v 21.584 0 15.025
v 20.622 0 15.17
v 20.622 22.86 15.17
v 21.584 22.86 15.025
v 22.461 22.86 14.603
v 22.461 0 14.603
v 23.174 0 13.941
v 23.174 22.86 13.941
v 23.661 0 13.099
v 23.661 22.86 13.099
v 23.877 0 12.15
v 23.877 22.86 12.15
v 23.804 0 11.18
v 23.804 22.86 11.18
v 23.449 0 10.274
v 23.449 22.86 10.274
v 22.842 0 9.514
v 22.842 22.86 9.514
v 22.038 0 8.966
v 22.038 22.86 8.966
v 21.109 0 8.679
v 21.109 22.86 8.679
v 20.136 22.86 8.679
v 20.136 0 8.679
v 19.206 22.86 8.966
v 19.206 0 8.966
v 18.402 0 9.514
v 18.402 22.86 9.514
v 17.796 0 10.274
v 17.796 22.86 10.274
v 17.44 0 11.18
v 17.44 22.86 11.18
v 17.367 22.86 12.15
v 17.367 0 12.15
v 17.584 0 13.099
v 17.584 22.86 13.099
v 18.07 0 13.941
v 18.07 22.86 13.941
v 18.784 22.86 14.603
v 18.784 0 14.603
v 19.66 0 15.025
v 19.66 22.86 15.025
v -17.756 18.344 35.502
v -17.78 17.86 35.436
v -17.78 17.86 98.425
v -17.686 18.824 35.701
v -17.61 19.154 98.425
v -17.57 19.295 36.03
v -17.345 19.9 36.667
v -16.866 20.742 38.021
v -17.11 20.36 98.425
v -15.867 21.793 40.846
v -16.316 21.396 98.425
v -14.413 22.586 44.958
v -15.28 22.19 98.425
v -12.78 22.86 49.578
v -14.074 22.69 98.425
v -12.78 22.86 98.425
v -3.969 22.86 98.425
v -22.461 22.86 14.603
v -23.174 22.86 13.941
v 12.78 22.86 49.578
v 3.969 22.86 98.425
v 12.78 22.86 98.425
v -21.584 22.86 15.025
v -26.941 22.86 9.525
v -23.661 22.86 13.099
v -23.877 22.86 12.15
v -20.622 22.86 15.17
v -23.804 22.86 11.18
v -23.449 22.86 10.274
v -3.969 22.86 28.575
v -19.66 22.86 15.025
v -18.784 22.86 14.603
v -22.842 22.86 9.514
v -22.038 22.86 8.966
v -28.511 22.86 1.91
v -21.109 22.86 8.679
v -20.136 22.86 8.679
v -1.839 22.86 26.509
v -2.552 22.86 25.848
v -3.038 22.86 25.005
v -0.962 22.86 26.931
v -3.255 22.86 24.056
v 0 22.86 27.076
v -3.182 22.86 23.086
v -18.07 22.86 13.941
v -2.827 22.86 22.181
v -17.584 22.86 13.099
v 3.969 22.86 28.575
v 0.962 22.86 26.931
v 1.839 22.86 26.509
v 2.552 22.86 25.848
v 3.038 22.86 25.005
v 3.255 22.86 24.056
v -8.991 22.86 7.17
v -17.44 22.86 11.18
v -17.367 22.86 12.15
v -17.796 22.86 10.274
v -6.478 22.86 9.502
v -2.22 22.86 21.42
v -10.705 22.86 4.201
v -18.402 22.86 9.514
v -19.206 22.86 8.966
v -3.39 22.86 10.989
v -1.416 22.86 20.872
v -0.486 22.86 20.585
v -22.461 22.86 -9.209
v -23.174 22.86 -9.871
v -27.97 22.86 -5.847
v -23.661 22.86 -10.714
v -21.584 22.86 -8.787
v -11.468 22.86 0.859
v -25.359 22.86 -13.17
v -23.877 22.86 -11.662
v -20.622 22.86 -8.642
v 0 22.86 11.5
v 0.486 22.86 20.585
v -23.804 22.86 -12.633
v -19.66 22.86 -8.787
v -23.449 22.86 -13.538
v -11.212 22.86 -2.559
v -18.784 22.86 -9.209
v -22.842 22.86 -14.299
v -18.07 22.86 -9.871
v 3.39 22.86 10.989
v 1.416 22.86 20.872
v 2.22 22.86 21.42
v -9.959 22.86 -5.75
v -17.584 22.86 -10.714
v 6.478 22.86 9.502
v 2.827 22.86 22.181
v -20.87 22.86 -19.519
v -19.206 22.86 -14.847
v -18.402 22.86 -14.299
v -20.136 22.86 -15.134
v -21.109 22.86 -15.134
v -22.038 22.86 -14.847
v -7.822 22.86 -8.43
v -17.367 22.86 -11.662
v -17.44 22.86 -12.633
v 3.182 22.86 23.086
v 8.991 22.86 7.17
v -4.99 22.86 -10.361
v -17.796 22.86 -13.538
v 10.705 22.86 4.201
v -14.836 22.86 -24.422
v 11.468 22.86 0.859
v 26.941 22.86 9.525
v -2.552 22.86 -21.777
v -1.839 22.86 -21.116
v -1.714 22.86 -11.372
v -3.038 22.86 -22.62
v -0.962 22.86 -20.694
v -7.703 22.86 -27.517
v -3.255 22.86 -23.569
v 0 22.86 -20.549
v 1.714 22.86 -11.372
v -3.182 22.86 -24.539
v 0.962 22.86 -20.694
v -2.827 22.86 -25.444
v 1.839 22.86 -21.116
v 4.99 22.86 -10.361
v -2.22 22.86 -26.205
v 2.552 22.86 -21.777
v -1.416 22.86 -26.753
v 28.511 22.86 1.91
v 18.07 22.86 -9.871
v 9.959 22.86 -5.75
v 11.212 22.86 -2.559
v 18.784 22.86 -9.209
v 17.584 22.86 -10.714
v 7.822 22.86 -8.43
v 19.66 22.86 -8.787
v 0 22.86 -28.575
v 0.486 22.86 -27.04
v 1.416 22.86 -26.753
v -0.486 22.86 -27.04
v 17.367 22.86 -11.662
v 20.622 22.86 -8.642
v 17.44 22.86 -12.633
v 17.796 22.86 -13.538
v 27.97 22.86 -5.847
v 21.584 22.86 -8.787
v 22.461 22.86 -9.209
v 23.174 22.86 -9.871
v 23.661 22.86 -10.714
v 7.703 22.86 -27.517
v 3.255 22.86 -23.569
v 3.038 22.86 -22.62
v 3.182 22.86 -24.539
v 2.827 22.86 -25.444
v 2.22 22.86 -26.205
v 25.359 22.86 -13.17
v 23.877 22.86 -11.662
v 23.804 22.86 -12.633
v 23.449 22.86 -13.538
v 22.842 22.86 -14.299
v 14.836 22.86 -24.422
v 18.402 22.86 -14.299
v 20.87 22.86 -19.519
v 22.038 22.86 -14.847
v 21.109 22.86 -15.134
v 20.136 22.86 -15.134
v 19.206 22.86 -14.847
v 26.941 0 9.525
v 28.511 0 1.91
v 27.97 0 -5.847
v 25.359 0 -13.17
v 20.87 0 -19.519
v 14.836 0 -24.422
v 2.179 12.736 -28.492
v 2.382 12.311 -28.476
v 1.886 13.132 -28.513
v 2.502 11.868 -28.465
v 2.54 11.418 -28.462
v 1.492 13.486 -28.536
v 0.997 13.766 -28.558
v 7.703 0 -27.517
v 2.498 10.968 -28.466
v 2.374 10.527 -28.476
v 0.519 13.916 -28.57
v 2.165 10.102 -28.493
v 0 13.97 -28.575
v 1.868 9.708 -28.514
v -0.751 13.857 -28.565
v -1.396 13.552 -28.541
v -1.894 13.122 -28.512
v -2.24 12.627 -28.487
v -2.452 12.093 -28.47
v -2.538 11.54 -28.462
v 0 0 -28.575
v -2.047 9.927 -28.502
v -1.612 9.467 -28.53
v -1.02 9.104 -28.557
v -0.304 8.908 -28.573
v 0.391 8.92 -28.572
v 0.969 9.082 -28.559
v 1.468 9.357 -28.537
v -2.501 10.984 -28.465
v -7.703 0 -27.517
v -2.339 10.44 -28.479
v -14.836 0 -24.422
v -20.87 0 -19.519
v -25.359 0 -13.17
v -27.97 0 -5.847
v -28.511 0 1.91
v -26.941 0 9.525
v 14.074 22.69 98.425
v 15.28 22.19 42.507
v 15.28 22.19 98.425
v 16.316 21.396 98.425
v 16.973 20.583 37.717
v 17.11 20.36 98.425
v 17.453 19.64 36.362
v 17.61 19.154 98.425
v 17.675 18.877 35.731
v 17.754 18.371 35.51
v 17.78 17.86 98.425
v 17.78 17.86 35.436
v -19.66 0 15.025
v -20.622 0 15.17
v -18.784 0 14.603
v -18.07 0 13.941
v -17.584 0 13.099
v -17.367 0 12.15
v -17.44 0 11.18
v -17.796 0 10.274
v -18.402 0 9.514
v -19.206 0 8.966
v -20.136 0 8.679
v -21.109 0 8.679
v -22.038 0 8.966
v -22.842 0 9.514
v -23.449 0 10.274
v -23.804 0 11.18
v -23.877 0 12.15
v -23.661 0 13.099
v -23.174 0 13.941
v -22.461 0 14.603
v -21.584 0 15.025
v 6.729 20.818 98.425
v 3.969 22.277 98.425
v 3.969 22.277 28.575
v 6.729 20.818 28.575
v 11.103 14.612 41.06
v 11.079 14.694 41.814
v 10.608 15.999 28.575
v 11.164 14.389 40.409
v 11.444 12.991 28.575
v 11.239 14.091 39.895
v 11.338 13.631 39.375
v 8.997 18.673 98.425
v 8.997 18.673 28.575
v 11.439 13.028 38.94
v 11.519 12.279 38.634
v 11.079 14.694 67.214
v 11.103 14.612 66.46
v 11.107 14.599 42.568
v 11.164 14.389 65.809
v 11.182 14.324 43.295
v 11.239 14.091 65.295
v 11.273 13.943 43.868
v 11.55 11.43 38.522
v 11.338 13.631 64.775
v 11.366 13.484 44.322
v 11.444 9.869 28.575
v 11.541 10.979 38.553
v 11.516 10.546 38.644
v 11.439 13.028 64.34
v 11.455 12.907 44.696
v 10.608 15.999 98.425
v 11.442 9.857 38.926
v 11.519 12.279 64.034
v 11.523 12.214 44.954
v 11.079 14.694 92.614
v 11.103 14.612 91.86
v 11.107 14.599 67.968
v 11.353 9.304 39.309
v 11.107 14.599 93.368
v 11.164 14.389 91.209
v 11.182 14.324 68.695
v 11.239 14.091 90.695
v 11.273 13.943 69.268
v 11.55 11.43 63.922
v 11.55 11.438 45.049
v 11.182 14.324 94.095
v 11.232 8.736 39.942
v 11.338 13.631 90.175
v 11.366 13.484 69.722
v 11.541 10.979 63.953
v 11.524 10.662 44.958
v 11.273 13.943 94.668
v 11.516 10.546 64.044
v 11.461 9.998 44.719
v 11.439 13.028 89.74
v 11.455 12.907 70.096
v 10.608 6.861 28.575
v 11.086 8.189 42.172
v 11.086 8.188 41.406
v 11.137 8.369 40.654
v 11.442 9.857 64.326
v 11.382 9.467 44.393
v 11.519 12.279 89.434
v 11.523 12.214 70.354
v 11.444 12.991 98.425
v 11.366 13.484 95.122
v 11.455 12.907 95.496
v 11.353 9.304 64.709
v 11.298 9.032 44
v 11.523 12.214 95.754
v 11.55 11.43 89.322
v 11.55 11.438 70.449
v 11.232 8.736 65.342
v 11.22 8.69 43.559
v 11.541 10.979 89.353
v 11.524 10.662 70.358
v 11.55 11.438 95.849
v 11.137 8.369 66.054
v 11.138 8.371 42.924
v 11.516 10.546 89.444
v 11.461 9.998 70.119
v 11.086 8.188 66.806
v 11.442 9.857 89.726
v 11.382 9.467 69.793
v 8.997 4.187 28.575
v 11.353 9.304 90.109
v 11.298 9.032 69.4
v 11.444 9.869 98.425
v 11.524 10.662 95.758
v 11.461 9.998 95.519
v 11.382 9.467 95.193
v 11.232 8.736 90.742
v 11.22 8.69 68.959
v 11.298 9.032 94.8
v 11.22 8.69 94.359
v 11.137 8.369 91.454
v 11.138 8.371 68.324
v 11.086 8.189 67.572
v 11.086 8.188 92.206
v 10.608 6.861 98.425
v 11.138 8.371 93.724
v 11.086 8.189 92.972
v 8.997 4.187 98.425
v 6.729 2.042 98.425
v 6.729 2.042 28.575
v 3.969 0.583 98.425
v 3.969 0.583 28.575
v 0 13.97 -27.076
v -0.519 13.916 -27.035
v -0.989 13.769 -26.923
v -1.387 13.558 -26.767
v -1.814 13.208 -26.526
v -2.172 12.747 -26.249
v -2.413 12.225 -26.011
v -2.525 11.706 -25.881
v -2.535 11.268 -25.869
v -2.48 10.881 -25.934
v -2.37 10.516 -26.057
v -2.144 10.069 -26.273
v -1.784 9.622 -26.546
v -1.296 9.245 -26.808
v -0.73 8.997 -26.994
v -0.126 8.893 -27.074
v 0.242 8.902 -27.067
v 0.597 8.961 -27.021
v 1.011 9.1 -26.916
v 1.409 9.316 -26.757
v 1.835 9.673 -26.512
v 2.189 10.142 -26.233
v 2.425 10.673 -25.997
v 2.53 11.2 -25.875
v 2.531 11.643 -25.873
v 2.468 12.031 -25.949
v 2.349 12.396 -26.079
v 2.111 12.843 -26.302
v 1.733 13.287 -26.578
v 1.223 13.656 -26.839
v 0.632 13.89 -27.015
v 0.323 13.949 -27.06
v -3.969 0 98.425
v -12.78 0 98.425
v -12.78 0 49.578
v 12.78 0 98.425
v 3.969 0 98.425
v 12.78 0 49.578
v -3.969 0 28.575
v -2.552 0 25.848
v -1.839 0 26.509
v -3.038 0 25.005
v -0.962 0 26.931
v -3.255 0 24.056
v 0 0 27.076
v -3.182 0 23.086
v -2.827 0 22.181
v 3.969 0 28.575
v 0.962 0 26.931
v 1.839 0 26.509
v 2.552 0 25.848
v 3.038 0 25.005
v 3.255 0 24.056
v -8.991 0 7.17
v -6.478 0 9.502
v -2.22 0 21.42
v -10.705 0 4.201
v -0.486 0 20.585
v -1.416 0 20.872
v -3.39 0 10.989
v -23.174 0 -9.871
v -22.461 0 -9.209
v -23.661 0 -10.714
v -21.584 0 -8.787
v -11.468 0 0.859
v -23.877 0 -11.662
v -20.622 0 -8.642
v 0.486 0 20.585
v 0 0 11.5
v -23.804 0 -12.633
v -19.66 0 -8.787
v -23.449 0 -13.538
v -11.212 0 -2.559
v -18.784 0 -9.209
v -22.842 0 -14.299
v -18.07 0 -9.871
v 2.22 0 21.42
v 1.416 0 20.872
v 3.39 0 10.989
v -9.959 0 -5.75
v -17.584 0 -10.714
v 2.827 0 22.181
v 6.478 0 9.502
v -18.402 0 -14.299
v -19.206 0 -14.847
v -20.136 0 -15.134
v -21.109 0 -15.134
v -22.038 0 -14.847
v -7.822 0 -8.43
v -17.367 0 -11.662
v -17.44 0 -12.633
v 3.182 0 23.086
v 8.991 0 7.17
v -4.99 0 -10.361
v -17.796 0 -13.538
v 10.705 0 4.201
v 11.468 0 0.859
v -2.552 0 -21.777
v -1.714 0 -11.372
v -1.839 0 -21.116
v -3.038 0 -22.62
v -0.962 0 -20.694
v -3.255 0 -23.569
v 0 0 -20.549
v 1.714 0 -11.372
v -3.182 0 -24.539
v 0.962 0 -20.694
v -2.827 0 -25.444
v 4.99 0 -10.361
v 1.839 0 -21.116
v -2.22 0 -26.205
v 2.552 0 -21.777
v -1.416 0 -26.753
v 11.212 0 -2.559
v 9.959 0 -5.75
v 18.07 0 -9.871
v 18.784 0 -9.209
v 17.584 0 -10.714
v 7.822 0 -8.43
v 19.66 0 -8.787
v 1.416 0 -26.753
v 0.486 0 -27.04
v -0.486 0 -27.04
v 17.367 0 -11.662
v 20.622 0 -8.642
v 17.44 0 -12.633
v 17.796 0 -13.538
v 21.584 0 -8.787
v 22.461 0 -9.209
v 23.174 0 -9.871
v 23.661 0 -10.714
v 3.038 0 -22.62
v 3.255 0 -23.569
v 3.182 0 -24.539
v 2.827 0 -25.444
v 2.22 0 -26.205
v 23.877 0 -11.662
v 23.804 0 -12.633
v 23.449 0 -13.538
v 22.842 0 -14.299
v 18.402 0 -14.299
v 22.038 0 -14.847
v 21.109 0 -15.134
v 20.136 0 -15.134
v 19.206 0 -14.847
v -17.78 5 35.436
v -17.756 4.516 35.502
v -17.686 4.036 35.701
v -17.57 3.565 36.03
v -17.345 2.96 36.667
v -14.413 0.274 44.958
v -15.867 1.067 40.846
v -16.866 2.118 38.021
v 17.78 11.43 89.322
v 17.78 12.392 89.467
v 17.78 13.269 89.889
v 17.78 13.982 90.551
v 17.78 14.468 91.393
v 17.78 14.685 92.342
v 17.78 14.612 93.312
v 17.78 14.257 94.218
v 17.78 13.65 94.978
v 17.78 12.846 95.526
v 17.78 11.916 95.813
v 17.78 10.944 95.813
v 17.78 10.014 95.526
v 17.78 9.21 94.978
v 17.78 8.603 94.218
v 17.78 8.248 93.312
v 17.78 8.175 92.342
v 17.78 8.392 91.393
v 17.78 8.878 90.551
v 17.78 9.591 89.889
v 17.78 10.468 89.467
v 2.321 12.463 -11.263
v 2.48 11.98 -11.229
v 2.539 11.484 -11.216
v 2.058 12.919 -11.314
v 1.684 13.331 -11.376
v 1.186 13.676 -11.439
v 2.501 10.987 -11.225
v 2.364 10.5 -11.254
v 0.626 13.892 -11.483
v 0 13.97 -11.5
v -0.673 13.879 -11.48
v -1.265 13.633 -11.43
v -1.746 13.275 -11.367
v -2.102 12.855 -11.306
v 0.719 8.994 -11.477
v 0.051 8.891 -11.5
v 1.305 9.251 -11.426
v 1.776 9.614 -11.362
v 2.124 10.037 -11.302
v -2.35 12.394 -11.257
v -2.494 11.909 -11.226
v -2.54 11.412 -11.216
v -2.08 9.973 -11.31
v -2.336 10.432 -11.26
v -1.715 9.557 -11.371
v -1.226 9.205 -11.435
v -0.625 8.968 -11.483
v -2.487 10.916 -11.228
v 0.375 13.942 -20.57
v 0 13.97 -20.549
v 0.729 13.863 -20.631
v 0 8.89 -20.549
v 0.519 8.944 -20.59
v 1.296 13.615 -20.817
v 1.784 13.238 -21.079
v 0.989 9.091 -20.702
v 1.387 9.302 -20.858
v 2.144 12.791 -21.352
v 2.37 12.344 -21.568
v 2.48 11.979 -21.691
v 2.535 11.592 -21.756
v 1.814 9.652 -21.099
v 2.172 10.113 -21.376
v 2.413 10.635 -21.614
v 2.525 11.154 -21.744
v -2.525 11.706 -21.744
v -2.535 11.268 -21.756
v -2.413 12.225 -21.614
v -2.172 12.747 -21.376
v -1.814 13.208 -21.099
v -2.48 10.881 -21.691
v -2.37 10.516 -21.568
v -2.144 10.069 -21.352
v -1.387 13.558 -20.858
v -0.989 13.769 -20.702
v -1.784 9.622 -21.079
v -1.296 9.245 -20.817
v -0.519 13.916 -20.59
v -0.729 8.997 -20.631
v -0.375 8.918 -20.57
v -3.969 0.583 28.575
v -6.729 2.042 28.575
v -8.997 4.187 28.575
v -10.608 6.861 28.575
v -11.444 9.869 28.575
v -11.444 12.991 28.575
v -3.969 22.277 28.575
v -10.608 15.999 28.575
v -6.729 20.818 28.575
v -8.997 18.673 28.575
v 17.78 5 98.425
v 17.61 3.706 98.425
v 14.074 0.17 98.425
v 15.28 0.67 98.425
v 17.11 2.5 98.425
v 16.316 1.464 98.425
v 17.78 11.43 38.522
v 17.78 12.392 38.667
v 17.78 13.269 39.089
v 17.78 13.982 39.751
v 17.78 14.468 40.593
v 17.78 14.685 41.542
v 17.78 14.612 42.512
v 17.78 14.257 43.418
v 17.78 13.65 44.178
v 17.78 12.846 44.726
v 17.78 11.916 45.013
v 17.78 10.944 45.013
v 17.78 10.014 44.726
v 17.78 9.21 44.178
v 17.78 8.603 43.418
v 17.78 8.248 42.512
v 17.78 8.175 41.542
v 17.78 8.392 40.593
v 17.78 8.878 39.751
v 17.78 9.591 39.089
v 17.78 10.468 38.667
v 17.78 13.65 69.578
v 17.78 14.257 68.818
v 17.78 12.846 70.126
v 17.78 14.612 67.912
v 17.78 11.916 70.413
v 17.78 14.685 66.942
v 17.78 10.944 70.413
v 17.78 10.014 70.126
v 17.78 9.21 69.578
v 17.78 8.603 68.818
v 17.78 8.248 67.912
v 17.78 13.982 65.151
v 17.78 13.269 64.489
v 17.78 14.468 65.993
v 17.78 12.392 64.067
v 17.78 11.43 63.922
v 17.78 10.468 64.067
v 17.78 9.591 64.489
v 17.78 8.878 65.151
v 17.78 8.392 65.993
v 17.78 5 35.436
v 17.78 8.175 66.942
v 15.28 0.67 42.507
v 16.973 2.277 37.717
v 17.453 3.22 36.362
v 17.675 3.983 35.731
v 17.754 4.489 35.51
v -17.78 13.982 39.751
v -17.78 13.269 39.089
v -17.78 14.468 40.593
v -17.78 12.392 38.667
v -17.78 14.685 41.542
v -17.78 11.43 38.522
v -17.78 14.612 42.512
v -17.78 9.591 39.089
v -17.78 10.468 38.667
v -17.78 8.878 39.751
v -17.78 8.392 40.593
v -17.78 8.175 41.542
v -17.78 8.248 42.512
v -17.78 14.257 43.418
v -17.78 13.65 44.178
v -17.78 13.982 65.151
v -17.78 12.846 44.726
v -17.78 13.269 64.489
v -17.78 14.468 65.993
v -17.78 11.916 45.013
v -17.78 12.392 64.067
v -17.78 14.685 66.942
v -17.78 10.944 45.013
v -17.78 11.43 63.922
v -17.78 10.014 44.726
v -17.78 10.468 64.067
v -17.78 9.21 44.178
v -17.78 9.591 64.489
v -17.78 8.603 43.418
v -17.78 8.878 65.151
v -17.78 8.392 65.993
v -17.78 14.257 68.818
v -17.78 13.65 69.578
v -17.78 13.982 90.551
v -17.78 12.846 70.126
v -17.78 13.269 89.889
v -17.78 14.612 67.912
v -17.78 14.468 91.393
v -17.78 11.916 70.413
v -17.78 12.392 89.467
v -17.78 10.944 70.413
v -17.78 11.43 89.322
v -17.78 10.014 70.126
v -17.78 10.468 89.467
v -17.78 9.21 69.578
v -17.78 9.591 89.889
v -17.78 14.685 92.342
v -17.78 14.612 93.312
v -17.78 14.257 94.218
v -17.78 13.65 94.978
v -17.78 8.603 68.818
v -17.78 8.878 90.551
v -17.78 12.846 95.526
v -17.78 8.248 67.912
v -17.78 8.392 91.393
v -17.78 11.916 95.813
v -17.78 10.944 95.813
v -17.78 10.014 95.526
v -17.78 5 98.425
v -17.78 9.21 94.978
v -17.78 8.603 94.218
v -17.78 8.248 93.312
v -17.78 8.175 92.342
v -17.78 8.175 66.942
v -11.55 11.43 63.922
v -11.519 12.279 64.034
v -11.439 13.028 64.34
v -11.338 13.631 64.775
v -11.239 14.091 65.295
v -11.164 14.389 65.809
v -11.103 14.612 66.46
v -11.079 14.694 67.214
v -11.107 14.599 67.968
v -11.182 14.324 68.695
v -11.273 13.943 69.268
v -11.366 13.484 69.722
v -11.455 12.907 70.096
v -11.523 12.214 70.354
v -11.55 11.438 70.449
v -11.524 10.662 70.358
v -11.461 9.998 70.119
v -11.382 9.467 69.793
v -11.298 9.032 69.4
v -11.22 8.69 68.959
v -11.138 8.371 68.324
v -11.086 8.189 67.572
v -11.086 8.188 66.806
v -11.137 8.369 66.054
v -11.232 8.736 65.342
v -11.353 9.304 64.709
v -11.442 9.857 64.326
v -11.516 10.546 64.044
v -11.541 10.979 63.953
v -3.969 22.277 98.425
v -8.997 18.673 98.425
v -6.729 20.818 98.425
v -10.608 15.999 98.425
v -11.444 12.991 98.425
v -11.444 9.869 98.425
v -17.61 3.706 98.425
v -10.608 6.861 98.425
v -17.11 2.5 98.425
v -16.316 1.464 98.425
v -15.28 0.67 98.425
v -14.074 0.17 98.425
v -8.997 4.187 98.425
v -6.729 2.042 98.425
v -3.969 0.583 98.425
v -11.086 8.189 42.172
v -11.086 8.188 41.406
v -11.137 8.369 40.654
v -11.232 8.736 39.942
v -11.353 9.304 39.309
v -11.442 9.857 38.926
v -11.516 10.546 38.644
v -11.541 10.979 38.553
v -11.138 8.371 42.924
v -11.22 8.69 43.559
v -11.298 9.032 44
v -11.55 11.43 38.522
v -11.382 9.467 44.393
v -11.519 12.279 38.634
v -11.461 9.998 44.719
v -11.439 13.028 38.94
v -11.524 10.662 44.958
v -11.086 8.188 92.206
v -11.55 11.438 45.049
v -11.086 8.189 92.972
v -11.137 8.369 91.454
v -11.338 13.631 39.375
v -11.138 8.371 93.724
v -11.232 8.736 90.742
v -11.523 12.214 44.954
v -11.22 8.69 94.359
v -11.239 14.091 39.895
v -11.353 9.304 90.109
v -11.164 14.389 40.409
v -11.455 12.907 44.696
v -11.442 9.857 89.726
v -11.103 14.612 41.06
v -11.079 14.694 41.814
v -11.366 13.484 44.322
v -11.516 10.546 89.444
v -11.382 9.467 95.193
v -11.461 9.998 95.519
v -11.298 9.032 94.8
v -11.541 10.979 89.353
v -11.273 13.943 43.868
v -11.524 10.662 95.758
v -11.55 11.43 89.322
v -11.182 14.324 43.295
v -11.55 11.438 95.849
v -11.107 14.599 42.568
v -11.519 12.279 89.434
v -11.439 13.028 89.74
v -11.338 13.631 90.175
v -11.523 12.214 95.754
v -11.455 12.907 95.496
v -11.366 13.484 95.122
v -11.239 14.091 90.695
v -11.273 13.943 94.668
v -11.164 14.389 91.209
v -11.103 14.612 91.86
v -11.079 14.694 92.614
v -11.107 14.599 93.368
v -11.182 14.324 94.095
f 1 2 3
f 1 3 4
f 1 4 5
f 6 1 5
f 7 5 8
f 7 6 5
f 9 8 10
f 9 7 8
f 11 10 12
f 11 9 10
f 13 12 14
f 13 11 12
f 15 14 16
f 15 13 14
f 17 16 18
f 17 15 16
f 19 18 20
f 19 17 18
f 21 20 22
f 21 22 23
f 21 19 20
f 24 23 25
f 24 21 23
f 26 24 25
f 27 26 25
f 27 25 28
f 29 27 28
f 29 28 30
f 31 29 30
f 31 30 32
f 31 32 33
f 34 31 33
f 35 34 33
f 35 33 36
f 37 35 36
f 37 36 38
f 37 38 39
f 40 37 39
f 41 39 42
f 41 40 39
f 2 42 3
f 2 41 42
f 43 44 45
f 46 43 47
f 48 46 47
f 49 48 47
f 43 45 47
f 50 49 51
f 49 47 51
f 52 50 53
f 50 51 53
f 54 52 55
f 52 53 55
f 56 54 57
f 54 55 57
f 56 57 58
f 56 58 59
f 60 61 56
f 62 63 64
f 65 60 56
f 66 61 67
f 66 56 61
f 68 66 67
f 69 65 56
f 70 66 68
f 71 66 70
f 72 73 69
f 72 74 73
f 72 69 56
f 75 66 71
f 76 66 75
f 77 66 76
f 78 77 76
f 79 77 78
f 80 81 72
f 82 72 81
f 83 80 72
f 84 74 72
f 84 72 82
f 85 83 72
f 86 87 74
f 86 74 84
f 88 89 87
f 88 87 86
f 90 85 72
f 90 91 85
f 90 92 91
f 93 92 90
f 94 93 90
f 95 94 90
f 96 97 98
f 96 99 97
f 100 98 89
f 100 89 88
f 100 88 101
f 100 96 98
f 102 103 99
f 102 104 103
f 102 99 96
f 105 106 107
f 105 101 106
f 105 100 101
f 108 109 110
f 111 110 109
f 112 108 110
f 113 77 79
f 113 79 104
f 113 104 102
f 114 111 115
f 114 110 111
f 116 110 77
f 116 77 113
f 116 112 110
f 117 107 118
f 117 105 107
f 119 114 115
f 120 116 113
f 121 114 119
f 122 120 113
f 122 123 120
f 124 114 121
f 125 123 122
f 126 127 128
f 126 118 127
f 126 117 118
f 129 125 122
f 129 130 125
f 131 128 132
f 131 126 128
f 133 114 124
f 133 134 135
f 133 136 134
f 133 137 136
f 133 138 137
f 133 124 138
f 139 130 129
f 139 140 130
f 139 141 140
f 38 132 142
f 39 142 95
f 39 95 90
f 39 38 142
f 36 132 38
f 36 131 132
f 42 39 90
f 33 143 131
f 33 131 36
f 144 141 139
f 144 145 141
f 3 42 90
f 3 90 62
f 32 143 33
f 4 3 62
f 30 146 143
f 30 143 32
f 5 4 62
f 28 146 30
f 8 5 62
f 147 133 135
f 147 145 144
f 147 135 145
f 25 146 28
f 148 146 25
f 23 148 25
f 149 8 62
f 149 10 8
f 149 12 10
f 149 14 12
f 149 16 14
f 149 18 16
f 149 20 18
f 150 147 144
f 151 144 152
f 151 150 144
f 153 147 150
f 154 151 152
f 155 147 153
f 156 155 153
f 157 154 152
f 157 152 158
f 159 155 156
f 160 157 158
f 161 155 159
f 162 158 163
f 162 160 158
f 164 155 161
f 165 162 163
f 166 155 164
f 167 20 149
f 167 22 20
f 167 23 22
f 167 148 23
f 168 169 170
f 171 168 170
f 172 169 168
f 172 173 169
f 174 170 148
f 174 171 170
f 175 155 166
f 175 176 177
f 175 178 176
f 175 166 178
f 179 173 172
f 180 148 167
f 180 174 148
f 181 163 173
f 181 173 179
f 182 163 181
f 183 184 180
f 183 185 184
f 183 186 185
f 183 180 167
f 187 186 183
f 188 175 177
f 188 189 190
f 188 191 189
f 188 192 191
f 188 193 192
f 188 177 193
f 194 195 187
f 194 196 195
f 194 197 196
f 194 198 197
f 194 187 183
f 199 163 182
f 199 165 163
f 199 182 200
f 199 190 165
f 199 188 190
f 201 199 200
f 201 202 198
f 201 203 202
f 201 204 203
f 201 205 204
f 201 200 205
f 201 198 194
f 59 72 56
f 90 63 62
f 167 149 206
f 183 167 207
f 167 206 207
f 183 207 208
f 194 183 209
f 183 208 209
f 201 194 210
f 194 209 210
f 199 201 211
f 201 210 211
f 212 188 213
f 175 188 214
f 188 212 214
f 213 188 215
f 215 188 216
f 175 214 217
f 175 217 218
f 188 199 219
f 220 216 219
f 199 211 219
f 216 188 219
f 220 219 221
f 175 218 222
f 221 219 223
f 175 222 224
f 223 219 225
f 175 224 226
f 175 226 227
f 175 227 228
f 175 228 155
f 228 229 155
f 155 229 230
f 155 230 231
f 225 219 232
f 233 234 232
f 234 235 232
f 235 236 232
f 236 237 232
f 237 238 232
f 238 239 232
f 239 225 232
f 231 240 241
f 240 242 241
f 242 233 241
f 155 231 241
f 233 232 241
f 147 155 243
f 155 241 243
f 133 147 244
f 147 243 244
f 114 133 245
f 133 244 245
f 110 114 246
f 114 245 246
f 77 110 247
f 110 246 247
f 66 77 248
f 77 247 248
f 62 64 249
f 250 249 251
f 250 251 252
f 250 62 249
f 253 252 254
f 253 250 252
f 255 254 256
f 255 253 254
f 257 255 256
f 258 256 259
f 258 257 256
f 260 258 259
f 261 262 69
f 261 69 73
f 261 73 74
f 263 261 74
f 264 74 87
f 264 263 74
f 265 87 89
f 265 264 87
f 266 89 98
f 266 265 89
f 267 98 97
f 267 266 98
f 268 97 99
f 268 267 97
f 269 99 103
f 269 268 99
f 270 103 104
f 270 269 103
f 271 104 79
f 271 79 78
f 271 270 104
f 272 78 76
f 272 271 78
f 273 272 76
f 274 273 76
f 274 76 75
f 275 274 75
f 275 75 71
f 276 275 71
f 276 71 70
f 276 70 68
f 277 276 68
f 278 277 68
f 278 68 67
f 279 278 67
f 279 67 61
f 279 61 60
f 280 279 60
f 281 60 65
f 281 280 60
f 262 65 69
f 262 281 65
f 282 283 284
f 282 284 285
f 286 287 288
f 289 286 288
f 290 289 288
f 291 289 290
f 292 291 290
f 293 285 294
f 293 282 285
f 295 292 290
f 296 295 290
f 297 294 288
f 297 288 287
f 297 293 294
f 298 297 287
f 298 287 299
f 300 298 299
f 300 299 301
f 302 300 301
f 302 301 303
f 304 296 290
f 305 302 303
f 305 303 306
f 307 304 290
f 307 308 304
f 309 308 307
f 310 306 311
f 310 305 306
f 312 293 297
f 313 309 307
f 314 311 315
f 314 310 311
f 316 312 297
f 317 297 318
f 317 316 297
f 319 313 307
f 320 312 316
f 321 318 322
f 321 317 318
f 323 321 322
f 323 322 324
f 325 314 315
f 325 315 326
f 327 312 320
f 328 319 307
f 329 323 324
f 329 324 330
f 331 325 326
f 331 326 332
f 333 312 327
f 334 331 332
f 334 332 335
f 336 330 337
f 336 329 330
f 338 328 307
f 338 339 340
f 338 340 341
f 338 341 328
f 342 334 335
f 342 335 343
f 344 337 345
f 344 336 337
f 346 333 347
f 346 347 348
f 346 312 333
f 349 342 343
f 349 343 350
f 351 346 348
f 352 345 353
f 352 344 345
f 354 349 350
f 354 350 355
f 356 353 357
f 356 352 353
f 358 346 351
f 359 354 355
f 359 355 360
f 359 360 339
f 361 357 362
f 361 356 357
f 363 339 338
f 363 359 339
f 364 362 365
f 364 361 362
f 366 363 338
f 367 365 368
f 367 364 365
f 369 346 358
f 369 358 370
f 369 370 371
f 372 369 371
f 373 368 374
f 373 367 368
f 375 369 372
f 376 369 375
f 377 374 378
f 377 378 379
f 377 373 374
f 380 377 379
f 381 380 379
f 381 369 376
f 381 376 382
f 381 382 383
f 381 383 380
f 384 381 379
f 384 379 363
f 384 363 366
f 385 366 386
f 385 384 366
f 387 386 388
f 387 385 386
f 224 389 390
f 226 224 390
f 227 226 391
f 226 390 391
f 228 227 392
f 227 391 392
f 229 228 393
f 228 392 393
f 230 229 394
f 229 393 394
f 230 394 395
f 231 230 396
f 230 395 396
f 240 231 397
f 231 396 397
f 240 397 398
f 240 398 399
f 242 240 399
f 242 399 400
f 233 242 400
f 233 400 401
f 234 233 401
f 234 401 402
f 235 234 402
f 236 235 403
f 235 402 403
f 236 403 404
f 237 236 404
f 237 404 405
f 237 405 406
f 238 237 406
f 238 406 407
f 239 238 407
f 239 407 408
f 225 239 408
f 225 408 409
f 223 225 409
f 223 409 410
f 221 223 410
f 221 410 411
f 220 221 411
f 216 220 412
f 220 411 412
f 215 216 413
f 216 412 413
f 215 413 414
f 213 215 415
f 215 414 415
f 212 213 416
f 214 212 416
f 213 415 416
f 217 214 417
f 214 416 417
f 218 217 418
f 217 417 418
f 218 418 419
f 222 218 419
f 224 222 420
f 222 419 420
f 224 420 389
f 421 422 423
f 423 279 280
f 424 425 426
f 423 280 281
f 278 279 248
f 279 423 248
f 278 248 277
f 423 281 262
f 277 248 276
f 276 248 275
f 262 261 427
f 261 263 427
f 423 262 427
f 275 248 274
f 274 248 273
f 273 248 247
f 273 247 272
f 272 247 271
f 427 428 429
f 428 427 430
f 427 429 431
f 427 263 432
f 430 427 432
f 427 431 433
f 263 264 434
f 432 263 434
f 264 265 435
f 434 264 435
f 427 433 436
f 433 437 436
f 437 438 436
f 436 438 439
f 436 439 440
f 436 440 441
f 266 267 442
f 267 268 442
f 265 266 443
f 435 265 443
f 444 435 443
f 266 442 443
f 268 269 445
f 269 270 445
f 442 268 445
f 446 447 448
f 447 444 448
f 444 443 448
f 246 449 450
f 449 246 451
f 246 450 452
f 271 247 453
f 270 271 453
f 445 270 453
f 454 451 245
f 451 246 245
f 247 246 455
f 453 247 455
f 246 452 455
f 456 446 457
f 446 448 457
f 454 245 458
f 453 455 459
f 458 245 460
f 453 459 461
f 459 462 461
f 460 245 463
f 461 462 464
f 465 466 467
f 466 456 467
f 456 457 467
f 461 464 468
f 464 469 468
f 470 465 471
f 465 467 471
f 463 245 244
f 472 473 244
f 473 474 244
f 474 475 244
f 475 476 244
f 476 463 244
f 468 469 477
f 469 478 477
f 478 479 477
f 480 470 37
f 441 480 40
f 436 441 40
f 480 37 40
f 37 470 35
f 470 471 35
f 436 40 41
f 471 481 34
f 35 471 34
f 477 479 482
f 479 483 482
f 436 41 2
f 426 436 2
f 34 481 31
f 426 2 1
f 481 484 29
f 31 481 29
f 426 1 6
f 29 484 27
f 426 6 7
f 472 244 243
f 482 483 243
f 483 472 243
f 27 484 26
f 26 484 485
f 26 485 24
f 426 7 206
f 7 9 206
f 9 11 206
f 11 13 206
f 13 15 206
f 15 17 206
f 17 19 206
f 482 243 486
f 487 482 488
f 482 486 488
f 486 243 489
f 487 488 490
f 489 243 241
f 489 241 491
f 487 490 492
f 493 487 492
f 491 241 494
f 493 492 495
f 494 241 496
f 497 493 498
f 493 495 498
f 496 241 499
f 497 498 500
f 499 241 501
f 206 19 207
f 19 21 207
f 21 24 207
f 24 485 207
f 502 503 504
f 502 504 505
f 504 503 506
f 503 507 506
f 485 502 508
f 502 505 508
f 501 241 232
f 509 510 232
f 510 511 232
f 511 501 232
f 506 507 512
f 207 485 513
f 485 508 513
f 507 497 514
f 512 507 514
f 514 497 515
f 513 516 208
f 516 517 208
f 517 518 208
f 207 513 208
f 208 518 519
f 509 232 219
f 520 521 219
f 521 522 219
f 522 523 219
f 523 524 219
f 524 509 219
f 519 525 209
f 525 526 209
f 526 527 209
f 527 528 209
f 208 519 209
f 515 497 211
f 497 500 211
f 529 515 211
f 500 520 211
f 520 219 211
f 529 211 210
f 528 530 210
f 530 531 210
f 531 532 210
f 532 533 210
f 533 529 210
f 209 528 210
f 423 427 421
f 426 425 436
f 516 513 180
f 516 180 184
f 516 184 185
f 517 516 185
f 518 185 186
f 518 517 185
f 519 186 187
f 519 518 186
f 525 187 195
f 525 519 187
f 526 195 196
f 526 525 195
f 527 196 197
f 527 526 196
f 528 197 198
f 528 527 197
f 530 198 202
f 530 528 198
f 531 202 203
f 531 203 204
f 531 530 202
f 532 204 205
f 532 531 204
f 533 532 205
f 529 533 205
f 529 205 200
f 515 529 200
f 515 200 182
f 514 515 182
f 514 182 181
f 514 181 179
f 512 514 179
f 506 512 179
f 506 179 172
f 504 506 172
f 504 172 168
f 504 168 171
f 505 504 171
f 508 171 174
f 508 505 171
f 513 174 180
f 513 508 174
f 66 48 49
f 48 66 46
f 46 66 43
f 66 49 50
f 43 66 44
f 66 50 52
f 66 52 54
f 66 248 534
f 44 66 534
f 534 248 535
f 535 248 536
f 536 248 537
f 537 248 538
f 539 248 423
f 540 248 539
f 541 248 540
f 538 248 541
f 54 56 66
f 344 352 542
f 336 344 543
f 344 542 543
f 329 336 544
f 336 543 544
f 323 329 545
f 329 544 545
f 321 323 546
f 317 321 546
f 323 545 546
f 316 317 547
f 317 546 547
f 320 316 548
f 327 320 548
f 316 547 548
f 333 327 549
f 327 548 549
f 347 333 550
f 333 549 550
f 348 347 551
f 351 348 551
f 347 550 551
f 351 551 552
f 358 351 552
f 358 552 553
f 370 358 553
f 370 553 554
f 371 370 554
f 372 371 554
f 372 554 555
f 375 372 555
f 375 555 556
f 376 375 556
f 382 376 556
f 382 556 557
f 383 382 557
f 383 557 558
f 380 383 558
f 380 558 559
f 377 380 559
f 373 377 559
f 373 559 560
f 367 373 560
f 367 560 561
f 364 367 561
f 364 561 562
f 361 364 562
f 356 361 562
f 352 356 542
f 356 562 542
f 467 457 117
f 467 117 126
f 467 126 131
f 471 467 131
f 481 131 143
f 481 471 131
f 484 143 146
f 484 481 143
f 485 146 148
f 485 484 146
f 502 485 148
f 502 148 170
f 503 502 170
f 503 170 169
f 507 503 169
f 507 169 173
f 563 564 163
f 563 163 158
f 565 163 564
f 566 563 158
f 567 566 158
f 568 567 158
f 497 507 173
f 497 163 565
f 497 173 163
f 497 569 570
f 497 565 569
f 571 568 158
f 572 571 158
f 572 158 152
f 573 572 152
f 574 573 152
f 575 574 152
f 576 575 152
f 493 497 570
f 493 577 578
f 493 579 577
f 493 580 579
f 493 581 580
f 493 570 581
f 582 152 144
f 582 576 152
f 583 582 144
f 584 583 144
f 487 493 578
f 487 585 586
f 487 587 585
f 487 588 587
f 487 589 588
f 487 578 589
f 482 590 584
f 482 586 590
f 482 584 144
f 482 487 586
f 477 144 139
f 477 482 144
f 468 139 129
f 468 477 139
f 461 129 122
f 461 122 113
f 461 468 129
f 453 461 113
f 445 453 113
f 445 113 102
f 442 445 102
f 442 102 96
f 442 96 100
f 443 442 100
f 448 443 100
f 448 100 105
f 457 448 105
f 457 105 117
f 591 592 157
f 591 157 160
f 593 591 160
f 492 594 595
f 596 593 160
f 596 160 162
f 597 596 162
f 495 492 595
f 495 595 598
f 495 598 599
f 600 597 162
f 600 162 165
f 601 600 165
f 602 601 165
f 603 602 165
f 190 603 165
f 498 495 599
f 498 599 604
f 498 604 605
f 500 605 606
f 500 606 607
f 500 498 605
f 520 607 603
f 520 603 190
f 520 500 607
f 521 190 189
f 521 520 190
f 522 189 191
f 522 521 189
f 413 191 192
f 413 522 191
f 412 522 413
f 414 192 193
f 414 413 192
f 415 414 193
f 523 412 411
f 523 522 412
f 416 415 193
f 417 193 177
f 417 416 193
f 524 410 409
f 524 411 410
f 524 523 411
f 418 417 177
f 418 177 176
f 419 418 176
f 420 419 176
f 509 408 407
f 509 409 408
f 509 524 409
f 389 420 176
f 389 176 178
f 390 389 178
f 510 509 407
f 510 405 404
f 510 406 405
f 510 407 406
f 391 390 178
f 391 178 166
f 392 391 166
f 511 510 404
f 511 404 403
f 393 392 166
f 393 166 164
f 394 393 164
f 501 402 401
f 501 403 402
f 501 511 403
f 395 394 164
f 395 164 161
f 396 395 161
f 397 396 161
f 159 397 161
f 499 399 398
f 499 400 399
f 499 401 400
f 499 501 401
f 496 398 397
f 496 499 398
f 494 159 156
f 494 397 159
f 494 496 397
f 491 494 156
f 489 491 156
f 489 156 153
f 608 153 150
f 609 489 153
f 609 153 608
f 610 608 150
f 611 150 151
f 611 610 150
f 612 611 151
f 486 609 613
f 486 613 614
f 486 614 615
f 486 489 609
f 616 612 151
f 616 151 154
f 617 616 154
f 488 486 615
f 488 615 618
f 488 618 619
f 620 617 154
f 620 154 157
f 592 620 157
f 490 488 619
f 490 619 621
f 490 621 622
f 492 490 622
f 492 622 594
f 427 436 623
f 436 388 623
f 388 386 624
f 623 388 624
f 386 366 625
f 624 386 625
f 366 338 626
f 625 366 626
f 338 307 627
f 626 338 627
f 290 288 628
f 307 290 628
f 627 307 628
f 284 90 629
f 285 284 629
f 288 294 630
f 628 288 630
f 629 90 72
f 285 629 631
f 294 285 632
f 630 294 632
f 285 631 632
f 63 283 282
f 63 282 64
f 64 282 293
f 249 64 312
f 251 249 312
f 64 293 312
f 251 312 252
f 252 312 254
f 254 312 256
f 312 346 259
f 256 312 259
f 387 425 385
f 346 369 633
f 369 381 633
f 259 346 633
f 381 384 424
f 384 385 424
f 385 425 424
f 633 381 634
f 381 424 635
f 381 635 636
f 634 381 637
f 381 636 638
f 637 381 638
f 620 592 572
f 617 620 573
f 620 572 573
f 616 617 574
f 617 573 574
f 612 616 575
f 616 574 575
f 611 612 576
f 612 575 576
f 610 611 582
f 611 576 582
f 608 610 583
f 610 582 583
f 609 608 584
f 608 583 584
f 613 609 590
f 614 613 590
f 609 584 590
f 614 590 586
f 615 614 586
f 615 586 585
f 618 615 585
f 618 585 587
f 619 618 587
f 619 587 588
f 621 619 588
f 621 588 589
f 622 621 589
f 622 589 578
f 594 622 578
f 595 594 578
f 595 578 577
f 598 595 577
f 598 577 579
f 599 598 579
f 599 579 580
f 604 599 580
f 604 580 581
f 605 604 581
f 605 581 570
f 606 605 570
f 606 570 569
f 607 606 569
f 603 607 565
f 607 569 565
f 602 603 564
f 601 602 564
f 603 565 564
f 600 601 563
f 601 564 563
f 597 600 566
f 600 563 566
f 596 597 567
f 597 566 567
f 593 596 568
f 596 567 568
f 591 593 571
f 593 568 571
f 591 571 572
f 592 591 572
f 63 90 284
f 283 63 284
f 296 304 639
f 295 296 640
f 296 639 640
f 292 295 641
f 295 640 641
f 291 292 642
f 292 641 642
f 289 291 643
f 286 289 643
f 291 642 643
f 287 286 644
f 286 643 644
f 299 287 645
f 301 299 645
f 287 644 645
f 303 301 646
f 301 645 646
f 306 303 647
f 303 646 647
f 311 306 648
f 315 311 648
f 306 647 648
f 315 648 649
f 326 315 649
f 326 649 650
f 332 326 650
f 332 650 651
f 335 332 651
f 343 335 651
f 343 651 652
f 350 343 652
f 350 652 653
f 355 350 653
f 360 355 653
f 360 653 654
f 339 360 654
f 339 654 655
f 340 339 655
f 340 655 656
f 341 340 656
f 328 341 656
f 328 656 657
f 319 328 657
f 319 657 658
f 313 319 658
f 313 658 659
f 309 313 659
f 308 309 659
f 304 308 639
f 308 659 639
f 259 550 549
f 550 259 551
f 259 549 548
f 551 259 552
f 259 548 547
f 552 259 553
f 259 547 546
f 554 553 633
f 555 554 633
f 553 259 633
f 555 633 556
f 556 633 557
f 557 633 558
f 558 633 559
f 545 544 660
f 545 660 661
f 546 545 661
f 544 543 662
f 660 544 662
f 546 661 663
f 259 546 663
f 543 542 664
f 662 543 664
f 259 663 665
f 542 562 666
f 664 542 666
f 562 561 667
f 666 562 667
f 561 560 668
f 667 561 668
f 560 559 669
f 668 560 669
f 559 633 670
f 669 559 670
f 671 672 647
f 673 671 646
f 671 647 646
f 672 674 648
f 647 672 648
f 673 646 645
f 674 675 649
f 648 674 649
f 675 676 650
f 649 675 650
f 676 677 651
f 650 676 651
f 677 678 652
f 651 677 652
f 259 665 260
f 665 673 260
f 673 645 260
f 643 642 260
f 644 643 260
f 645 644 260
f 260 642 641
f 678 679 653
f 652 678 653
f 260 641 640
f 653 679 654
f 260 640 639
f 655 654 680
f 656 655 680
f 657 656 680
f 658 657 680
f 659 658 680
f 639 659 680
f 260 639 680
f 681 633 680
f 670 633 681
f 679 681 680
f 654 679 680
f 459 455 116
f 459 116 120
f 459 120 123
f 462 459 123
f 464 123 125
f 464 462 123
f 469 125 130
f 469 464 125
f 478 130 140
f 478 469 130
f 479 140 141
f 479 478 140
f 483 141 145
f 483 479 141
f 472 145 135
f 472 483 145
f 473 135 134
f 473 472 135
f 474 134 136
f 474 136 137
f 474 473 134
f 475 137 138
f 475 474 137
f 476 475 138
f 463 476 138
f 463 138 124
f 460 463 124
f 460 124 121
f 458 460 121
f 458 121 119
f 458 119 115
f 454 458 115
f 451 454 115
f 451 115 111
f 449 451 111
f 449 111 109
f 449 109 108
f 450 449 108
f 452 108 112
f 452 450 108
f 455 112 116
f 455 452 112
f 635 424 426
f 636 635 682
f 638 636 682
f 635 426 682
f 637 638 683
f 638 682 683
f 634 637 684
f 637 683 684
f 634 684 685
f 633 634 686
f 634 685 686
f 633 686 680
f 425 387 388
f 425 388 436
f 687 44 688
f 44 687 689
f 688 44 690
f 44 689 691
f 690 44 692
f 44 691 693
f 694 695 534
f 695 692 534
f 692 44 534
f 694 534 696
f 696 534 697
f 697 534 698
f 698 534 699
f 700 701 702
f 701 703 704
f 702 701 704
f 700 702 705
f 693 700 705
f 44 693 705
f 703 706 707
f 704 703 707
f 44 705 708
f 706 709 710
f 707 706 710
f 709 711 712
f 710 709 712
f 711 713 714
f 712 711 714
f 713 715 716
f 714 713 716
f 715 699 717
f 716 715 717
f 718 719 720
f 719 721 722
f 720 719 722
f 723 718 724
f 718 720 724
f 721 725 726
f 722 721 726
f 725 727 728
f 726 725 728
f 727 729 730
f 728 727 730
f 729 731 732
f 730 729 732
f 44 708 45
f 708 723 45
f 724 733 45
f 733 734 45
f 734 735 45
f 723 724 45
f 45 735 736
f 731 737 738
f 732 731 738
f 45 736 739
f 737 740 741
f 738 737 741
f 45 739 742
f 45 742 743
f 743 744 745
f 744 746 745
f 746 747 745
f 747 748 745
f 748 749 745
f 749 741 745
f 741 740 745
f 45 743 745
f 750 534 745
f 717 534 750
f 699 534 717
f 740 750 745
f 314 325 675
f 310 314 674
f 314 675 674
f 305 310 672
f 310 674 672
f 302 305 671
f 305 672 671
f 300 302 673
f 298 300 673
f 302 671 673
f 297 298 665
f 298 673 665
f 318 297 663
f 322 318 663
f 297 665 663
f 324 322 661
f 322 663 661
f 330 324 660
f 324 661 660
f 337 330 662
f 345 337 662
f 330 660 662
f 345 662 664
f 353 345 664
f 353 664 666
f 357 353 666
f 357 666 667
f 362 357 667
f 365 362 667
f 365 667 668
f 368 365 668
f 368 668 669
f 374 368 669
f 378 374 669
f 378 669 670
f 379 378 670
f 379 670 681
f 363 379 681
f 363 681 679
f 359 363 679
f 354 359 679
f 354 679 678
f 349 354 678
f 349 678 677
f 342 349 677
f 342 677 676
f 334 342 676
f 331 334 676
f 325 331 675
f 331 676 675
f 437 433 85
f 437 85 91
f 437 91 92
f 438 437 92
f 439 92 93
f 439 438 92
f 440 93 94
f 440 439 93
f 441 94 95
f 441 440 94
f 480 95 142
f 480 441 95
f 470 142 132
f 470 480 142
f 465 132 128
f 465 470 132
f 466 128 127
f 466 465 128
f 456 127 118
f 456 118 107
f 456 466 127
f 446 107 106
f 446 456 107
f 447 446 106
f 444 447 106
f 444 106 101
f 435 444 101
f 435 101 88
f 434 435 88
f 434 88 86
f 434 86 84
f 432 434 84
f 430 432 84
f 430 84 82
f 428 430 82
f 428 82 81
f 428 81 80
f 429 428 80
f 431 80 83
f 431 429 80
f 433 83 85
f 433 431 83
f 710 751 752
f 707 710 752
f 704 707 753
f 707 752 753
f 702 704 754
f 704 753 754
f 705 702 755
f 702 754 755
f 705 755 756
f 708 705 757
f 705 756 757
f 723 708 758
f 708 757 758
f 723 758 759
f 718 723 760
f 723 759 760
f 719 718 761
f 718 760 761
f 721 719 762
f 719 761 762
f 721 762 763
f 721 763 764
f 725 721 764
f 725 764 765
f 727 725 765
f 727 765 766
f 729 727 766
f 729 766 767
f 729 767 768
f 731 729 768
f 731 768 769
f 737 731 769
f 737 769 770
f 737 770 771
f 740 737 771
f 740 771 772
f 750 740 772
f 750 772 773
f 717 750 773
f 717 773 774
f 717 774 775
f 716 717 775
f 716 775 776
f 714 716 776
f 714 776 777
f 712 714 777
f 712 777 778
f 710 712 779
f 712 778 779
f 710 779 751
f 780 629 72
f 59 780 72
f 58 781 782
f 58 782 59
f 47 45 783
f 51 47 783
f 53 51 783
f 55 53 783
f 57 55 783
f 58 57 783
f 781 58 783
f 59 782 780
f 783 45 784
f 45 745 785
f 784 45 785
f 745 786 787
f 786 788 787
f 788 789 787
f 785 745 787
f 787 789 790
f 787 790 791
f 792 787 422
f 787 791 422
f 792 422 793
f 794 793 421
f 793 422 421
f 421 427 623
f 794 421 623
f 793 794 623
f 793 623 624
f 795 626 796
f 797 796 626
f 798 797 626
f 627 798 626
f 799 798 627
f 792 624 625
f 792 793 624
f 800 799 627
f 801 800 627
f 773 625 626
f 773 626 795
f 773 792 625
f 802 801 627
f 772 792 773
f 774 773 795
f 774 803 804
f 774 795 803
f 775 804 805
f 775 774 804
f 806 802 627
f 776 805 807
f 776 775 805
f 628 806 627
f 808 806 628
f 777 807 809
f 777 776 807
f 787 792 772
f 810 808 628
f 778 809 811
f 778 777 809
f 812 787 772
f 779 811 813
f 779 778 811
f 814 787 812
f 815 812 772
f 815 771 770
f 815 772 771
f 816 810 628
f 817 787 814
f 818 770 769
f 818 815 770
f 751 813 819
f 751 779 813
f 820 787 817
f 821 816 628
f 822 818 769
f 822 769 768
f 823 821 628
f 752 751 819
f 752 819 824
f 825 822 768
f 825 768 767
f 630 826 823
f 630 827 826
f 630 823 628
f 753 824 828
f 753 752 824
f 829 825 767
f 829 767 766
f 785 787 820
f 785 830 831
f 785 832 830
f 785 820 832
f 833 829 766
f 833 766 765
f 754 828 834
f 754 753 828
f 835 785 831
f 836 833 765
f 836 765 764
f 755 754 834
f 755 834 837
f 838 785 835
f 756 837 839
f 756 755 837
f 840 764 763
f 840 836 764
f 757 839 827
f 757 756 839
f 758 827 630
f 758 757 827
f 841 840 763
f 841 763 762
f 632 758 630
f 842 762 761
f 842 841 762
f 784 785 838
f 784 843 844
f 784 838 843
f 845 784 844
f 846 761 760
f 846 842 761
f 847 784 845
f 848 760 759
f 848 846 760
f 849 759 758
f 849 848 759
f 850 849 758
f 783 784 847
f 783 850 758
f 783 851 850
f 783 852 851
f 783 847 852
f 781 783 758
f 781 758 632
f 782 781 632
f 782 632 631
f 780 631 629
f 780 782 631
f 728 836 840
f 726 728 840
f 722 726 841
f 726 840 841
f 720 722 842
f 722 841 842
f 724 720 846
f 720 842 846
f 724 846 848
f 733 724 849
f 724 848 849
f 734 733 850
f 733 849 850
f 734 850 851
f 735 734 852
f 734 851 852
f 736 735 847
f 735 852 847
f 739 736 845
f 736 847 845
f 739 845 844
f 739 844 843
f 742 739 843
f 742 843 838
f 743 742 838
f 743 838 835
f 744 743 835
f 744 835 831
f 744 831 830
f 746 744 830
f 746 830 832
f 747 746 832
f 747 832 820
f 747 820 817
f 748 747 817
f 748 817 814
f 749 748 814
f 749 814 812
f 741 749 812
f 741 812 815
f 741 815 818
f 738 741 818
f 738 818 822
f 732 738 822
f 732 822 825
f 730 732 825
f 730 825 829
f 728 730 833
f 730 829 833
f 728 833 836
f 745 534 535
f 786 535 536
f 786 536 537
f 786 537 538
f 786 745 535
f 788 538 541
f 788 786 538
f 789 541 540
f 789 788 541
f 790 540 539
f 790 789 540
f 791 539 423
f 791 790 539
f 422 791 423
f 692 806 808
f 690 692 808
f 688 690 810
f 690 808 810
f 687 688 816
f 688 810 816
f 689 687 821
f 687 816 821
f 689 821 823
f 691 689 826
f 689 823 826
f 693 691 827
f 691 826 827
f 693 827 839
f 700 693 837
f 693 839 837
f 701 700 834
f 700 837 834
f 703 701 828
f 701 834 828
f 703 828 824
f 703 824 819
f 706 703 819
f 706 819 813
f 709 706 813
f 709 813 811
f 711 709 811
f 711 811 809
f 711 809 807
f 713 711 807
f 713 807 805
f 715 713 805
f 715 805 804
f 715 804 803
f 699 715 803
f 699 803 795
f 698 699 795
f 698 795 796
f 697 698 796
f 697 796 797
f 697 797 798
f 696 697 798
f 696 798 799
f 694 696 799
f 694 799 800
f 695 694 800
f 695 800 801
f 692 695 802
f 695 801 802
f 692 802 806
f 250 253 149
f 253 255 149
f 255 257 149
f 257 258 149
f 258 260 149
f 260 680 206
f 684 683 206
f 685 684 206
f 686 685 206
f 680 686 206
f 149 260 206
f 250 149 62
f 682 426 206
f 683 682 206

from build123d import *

# Parameters (mm, degrees)
SKETCH3_R               = 11.5
SKETCH3_R_2             = 3.2639
BOSS_EXTRUDE1_DEPTH     = 22.86
CUT_EXTRUDE1_DEPTH      = 69.85
SKETCH6_R               = 3.2639
CUT_EXTRUDE2_DEPTH      = 112.17034789
FILLET1_R               = 5
CUT_EXTRUDE4_REACH      = 97.698
CUT_EXTRUDE4_END_RADIUS = 28.575
SKETCH8_R               = 2.54


with BuildPart() as part:
    # Sketch3 → Boss-Extrude1 (new body)
    with BuildSketch(Plane(origin=(0, 0, 0), x_dir=(1, 0, 0), z_dir=(0, 1, 0))):
        with BuildLine():
            Line((-26.940768363, -9.525), (-17.78, -35.435565722))
            Line((-17.78, -35.435565722), (-17.78, -98.425))
            Line((-17.78, -98.425), (17.78, -98.425))
            Line((17.78, -98.425), (17.78, -35.435565722))
            Line((17.78, -35.435565722), (26.940768363, -9.525))
            ThreePointArc((26.940768363, -9.525), (0, 28.575), (-26.940768363, -9.525))
        make_face()
        with Locations(Location((0, 0, 0), (0, 0, 270))):
            Circle(SKETCH3_R, mode=Mode.SUBTRACT)
        with Locations(Location((0, 23.8125, 0), (0, 0, 270))):
            Circle(SKETCH3_R_2, mode=Mode.SUBTRACT)
        with Locations(Location((20.622229928, 11.90625, 0), (0, 0, 270))):
            Circle(SKETCH3_R_2, mode=Mode.SUBTRACT)
        with Locations(Location((20.622229928, -11.90625, 0), (0, 0, 270))):
            Circle(SKETCH3_R_2, mode=Mode.SUBTRACT)
        with Locations(Location((0, -23.8125, 0), (0, 0, 270))):
            Circle(SKETCH3_R_2, mode=Mode.SUBTRACT)
        with Locations(Location((-20.622229928, -11.90625, 0), (0, 0, 270))):
            Circle(SKETCH3_R_2, mode=Mode.SUBTRACT)
        with Locations(Location((-20.622229928, 11.90625, 0), (0, 0, 270))):
            Circle(SKETCH3_R_2, mode=Mode.SUBTRACT)
    extrude(amount=BOSS_EXTRUDE1_DEPTH)

    # Sketch4 → Cut-Extrude1 (cut)
    with BuildSketch(Plane.XY.offset(98.425)):
        with BuildLine():
            Line((3.96875, 0), (-3.96875, 0))
            Line((-3.96875, 0), (-3.96875, 0.583271302))
            ThreePointArc((-3.96875, 0.583271302), (-11.55, 11.43), (-3.96875, 22.276728698))
            Line((-3.96875, 22.276728698), (-3.96875, 22.86))
            Line((-3.96875, 22.86), (3.96875, 22.86))
            Line((3.96875, 22.86), (3.96875, 22.276728698))
            ThreePointArc((3.96875, 22.276728698), (11.55, 11.43), (3.96875, 0.583271302))
            Line((3.96875, 0.583271302), (3.96875, 0))
        make_face()
    extrude(amount=-CUT_EXTRUDE1_DEPTH, mode=Mode.SUBTRACT)

    # Sketch6 → Cut-Extrude2 (cut, through all)
    with BuildSketch(Plane(origin=(17.78, 0, 0), x_dir=(0, 0, -1), z_dir=(1, 0, 0))):
        with Locations((-41.785565722, 11.43)):
            Circle(SKETCH6_R)
        with Locations((-67.185565722, 11.43)):
            Circle(SKETCH6_R)
        with Locations((-92.585565722, 11.43)):
            Circle(SKETCH6_R)
    extrude(amount=-CUT_EXTRUDE2_DEPTH, mode=Mode.SUBTRACT)

    # Fillet1
    fillet1_edges = [part.edges().sort_by_distance(p)[0] for p in [
        (-17.78, 22.86, 66.930282861),
        (17.78, 22.86, 66.930282861),
        (-17.78, 0, 66.930282861),
        (17.78, 0, 66.930282861),
    ]]
    fillet(fillet1_edges, radius=FILLET1_R)

    # Cut-Extrude4: up to this cylinder (the profile starts inside it)
    cut_extrude4_end = Plane(origin=(0, 11.43, 0), z_dir=(0, -1, 0)) * Cylinder(CUT_EXTRUDE4_END_RADIUS, 253.546, mode=Mode.PRIVATE)
    # Sketch8 → Cut-Extrude4 (cut, up to the surface)
    with BuildSketch(Plane.XY.offset(10), mode=Mode.PRIVATE) as cut_extrude4_sk1:
        with Locations(Location((0, 11.43, 0), (0, 0, 90))):
            Circle(SKETCH8_R)
    cut_extrude4_tool1 = extrude(cut_extrude4_sk1.sketch, amount=-CUT_EXTRUDE4_REACH, mode=Mode.PRIVATE) & cut_extrude4_end
    add(cut_extrude4_tool1.solids().sort_by_distance((0, 11.43, 10))[0], mode=Mode.SUBTRACT)


solid = part.part
